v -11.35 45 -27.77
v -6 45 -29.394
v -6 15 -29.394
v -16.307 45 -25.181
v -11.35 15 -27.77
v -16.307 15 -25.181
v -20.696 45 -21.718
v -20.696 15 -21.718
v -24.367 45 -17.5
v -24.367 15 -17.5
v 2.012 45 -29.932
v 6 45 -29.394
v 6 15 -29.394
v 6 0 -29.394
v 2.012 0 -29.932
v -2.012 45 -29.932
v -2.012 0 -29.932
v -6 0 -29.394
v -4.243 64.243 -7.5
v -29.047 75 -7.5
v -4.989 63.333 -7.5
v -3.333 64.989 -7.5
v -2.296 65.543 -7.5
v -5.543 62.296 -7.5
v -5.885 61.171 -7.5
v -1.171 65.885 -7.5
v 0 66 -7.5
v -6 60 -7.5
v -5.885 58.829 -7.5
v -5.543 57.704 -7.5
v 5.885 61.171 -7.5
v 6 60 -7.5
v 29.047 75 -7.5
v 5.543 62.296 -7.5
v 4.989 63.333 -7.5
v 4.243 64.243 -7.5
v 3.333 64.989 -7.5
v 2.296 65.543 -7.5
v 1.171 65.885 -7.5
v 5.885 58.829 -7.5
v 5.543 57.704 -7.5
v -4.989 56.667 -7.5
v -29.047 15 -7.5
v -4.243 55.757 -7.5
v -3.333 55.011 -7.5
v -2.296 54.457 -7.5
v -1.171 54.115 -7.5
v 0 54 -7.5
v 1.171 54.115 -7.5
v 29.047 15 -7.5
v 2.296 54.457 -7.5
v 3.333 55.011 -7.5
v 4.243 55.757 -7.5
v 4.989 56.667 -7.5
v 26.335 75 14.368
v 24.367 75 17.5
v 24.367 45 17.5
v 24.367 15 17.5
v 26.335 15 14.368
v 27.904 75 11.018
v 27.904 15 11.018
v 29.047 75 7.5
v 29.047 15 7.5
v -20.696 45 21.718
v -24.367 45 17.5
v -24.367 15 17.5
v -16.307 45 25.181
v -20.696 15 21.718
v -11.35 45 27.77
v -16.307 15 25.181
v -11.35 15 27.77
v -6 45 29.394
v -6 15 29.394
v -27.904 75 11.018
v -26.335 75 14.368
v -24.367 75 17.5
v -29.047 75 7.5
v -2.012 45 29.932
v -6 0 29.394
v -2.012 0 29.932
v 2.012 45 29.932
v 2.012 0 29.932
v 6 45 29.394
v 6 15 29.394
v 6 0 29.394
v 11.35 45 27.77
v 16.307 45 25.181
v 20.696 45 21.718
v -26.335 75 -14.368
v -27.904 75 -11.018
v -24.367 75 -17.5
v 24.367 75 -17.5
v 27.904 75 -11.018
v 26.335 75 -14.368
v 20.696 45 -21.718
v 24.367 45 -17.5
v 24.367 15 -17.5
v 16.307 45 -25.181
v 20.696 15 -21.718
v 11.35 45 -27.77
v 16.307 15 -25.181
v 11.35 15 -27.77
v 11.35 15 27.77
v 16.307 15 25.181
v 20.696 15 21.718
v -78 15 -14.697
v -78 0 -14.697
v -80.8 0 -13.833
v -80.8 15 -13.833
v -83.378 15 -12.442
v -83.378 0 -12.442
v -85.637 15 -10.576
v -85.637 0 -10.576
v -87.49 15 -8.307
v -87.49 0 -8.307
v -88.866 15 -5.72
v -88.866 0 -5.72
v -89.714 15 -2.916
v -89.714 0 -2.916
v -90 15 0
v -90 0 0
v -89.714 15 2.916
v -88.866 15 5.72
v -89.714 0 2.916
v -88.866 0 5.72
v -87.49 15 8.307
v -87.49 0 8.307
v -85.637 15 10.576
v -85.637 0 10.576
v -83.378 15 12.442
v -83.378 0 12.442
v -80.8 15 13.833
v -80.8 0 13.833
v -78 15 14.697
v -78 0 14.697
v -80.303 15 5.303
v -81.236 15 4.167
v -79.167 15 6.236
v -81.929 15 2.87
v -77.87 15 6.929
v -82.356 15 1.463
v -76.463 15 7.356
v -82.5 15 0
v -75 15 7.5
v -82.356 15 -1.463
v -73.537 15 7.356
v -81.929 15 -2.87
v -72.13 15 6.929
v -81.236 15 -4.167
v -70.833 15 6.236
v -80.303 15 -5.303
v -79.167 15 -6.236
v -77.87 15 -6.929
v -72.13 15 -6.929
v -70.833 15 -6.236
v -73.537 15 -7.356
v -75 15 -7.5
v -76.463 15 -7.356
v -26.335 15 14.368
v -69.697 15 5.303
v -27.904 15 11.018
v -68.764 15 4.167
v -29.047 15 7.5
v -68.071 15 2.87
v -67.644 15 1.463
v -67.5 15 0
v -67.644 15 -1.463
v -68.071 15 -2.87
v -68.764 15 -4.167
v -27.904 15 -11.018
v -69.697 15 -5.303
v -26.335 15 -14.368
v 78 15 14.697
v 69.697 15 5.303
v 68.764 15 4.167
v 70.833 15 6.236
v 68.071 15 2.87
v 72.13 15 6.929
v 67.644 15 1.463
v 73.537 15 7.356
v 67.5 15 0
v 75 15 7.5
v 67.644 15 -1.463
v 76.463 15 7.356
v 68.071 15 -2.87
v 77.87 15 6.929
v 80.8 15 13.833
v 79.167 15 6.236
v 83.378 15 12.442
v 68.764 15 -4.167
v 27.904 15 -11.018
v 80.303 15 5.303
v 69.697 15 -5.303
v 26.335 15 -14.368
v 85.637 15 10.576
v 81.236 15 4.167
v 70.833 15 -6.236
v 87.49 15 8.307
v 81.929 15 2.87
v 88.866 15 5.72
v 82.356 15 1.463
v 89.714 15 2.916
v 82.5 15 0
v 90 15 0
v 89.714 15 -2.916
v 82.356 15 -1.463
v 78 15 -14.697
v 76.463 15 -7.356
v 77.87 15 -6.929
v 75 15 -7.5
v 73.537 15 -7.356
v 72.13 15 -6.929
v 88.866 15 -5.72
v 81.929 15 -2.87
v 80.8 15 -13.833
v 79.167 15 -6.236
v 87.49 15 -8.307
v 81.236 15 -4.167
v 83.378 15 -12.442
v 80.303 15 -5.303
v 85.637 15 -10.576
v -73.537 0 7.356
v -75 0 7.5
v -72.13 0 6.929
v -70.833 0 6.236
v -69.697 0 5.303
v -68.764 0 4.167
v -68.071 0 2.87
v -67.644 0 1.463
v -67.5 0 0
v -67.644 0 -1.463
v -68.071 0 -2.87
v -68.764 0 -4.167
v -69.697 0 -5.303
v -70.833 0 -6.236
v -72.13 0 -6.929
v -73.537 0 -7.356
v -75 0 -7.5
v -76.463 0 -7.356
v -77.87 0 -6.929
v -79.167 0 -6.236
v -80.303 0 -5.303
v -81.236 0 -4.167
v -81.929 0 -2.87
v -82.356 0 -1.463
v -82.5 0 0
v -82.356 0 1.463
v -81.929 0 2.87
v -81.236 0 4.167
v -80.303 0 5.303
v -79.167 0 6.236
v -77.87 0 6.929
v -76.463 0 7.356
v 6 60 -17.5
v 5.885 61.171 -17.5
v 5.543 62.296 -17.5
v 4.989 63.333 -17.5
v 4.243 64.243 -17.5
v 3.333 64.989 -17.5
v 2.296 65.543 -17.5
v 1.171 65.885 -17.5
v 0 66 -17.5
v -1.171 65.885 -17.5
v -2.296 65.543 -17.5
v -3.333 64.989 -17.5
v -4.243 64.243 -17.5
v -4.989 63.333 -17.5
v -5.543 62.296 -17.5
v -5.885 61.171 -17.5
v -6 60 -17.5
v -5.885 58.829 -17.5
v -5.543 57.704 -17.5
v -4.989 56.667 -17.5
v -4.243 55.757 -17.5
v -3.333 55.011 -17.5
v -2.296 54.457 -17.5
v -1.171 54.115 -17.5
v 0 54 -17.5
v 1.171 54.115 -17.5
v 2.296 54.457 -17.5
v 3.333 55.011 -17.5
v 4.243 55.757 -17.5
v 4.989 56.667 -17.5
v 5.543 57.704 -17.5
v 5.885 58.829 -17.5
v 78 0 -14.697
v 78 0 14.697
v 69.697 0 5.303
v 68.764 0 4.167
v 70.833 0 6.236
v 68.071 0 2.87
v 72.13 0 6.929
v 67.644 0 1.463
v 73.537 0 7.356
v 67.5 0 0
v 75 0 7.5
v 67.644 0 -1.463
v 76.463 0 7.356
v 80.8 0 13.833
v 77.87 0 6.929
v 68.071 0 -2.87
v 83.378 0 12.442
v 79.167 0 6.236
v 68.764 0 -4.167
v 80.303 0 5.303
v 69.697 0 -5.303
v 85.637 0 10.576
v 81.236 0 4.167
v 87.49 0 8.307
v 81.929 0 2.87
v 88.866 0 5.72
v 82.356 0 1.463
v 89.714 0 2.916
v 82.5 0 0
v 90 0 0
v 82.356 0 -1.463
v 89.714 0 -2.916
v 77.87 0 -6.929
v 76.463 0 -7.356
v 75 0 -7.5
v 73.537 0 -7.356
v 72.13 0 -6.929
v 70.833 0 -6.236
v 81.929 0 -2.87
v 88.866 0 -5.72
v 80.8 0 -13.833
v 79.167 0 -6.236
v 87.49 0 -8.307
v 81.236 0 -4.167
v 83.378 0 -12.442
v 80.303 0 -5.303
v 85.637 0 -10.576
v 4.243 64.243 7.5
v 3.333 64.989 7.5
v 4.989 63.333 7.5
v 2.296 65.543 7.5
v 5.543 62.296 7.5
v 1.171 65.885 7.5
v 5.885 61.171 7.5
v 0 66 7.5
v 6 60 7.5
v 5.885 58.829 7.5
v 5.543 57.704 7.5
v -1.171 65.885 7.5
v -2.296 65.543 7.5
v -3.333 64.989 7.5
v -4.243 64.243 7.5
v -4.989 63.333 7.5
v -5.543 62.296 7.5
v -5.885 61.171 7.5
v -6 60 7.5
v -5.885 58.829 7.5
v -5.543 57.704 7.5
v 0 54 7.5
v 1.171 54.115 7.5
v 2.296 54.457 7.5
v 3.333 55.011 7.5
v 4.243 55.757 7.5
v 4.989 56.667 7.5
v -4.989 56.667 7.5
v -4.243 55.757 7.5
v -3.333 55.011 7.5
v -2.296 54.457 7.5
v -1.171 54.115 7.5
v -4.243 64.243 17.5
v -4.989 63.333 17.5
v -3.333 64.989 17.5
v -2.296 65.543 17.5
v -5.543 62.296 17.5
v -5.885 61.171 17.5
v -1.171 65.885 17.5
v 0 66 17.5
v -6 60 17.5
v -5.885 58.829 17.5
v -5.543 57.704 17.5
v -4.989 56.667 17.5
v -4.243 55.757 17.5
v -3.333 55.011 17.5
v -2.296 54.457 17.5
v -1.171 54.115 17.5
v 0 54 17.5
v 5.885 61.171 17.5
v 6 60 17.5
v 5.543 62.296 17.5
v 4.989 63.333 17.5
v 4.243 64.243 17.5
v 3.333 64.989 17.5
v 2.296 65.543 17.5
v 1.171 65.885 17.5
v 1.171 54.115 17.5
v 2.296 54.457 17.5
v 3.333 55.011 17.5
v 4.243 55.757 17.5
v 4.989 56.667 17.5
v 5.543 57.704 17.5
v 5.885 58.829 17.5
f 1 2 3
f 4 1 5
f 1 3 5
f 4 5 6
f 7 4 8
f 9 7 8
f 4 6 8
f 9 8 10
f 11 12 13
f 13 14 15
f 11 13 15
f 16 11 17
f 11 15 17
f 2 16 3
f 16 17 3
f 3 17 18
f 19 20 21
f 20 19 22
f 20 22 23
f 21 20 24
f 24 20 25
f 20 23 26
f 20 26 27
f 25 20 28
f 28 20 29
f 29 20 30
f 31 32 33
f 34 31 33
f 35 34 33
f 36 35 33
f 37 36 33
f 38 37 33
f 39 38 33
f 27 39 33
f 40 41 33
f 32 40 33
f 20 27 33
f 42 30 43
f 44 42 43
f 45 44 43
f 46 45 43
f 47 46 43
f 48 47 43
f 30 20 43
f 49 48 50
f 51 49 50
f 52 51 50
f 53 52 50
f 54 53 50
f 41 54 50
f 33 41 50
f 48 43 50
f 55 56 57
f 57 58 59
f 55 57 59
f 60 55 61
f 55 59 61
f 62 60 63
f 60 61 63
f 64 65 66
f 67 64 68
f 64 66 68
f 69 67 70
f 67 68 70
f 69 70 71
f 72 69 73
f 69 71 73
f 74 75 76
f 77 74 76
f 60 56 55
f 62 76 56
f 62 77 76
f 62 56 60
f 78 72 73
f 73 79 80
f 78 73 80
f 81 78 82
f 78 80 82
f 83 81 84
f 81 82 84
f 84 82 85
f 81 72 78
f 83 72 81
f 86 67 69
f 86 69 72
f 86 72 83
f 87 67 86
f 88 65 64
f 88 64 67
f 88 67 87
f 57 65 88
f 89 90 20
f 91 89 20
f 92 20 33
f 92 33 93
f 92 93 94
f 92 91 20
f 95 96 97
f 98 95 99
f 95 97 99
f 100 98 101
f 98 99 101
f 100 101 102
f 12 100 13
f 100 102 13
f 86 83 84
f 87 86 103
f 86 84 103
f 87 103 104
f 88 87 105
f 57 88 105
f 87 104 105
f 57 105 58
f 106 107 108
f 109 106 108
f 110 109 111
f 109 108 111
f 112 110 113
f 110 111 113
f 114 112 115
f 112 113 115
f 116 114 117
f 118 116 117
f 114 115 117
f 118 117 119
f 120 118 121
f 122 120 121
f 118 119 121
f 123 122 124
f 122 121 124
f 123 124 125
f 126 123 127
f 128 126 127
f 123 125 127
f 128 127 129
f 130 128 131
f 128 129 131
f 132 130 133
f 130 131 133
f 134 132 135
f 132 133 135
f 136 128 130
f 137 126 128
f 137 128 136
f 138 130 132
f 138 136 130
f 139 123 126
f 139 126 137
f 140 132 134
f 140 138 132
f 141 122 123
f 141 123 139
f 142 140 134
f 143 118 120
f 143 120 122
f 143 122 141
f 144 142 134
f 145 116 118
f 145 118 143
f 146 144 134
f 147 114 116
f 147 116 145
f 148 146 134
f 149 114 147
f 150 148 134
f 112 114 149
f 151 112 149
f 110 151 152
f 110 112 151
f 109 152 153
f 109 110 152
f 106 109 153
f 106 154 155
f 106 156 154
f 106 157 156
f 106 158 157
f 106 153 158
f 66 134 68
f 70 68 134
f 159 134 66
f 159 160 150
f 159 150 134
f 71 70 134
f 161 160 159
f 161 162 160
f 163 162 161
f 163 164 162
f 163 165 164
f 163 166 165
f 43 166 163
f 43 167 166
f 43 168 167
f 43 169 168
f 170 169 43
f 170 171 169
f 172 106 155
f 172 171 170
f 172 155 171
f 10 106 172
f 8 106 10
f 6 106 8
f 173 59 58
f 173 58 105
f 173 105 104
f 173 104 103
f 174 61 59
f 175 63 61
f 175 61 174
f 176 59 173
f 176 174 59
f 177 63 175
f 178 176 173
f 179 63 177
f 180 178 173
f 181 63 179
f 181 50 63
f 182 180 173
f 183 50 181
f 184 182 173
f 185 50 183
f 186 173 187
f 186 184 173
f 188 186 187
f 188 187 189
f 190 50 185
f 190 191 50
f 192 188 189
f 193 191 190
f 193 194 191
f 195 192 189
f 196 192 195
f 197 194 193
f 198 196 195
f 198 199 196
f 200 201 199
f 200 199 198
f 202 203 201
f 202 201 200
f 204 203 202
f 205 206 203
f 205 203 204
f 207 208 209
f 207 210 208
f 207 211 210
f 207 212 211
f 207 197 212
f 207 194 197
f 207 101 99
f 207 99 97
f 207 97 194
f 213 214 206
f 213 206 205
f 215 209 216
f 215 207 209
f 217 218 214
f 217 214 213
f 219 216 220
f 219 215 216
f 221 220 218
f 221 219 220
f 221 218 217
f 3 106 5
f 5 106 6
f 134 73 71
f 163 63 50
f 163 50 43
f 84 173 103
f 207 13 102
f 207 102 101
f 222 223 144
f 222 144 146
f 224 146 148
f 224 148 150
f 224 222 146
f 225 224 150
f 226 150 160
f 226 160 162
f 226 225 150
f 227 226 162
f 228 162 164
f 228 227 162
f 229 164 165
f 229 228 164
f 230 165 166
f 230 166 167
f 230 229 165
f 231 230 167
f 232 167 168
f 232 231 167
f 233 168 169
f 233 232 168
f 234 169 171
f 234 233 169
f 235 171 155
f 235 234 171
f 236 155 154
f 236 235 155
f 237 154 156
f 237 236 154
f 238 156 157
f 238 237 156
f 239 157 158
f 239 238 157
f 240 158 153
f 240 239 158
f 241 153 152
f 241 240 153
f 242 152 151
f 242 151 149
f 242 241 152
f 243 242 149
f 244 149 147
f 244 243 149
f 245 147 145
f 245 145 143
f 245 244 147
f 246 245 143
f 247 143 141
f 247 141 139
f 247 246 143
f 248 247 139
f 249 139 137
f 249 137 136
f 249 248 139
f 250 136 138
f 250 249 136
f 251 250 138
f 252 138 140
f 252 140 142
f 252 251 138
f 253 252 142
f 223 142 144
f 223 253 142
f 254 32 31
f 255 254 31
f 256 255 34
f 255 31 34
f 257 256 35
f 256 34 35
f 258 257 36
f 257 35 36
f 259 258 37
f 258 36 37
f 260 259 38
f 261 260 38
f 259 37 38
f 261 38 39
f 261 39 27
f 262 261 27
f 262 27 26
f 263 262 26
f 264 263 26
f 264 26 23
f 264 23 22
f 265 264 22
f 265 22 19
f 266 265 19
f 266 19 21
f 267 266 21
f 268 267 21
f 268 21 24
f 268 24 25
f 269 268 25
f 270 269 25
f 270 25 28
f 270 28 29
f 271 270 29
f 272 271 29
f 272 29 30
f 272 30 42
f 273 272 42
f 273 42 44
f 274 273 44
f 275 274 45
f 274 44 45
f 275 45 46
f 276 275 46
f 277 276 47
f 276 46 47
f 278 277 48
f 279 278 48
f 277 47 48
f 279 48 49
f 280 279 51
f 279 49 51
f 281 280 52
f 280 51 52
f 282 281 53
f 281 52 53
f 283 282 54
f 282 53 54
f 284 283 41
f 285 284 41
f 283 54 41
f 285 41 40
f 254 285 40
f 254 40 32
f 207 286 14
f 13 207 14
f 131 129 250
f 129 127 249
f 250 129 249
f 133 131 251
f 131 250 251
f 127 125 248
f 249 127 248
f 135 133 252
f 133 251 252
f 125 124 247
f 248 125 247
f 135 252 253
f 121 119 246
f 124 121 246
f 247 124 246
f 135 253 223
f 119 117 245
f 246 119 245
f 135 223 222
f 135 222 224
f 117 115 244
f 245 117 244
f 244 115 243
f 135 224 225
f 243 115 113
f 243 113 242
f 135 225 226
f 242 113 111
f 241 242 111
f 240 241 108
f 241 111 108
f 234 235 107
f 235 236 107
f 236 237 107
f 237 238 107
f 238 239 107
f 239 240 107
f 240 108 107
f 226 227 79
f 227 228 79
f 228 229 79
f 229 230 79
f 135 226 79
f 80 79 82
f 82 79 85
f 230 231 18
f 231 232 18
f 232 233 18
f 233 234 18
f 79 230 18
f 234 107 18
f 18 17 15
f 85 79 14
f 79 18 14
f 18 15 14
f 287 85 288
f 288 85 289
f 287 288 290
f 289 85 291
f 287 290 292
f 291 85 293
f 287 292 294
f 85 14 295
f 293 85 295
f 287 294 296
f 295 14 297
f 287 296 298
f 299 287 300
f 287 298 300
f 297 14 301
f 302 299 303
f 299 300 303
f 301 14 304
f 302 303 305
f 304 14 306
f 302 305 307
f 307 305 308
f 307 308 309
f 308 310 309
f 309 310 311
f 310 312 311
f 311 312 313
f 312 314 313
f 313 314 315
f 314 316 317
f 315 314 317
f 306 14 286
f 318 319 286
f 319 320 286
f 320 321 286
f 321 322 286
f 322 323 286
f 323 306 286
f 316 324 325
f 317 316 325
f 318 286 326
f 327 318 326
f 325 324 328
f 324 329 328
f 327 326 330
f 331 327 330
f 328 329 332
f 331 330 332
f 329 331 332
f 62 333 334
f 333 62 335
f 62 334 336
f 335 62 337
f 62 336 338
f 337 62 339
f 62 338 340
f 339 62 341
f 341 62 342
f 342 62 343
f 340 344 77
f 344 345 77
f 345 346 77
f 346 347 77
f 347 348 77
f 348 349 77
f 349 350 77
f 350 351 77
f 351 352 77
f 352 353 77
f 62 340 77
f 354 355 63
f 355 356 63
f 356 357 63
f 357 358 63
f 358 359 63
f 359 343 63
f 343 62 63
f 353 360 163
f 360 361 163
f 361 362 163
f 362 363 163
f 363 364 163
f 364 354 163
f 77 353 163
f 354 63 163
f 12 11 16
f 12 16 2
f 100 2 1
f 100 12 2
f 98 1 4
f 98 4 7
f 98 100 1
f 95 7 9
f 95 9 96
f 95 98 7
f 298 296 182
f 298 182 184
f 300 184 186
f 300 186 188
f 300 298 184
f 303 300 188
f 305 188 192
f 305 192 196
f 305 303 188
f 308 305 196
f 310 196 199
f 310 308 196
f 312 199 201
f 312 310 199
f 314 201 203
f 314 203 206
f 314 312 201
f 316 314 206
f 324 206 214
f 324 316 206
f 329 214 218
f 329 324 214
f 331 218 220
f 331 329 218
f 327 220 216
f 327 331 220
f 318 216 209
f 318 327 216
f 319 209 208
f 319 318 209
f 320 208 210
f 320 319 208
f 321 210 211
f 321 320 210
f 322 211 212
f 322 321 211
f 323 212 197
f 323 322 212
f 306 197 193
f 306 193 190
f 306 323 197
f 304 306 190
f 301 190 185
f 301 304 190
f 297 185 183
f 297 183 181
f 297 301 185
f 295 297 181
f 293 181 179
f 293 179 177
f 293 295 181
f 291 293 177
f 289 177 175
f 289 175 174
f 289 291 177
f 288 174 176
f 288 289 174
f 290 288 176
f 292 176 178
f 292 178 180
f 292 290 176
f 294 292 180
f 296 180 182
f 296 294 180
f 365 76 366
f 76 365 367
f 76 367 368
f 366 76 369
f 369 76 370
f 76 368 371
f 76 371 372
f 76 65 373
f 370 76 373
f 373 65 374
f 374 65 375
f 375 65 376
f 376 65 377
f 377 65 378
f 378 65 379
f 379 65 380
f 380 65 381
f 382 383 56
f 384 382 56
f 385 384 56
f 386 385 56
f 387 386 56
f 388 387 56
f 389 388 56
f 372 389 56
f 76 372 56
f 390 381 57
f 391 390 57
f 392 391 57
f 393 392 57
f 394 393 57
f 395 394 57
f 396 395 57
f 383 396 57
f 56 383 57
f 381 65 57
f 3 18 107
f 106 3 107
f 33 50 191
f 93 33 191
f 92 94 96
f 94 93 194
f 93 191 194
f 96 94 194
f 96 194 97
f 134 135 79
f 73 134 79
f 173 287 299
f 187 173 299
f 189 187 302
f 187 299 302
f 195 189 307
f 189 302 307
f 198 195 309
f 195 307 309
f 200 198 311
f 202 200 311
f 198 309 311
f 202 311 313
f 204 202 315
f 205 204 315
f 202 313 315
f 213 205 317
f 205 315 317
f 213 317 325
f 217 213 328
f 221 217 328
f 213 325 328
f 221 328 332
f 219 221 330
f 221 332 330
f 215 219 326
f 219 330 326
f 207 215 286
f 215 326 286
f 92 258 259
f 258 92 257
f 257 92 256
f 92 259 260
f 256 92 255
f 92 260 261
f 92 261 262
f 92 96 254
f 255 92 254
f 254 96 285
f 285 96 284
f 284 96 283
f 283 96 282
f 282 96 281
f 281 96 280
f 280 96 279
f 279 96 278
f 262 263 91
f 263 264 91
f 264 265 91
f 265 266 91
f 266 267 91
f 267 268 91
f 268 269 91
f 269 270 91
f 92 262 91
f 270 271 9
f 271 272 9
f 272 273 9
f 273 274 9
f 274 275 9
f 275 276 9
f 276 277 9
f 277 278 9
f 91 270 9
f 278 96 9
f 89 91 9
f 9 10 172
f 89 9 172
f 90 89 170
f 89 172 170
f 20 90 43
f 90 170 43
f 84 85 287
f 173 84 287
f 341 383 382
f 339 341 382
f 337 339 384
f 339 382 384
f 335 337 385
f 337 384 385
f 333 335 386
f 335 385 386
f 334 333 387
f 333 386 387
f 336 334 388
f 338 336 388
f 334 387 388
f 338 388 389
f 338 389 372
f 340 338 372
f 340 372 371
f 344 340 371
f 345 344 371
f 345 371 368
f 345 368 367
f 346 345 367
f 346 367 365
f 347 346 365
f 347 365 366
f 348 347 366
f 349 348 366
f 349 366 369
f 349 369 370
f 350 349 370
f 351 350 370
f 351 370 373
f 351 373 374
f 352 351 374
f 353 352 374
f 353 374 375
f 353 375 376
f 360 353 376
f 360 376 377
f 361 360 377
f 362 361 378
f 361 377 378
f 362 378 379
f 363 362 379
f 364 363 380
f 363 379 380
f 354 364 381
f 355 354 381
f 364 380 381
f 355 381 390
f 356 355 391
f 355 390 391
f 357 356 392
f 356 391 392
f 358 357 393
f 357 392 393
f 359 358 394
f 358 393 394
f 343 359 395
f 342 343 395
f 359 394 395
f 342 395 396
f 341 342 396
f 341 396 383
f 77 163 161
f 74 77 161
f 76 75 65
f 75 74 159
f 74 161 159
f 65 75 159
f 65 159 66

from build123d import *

# Parameters (mm, degrees)
BOSS_EXTRUDE1_DEPTH   = 75
BOSS_EXTRUDE1_2_DEPTH = 75
BOSS_EXTRUDE2_DEPTH   = 45
SKETCH1_5_R           = 7.5
BOSS_EXTRUDE3_DEPTH   = 15
SKETCH2_R             = 6
CUT_EXTRUDE1_DEPTH    = 127.416968798


with BuildPart() as part:
    # Sketch1 → Boss-Extrude1 (new body)
    with BuildSketch(Plane(origin=(0, 0, 0), x_dir=(1, 0, 0), z_dir=(0, 1, 0))):
        with BuildLine():
            Line((24.366985862, 17.5), (-24.366985862, 17.5))
            ThreePointArc((-24.366985862, 17.5), (-27.171188586, 12.717173855), (-29.047375097, 7.5))
            Line((-29.047375097, 7.5), (29.047375097, 7.5))
            ThreePointArc((29.047375097, 7.5), (27.171188586, 12.717173855), (24.366985862, 17.5))
        make_face()
    extrude(amount=BOSS_EXTRUDE1_DEPTH)



with BuildPart() as body_2:
    # Sketch1 → Boss-Extrude1 2 (new body)
    with BuildSketch(Plane(origin=(0, 0, 0), x_dir=(1, 0, 0), z_dir=(0, 1, 0))):
        with BuildLine():
            ThreePointArc((-29.047375097, -7.5), (-27.171188586, -12.717173855), (-24.366985862, -17.5))
            Line((-24.366985862, -17.5), (24.366985862, -17.5))
            ThreePointArc((24.366985862, -17.5), (27.171188586, -12.717173855), (29.047375097, -7.5))
            Line((29.047375097, -7.5), (-29.047375097, -7.5))
        make_face()
    extrude(amount=BOSS_EXTRUDE1_2_DEPTH)


with BuildPart() as part_1:
    add(part.part)

    add(body_2.part)  # Boss-Extrude2 merges body 2
    # Sketch1<4> → Boss-Extrude2 (add)
    with BuildSketch(Plane(origin=(0, 0, 0), x_dir=(1, 0, 0), z_dir=(0, 1, 0))):
        with BuildLine():
            ThreePointArc((24.366985862, 17.5), (0, 30), (-24.366985862, 17.5))
            Line((-24.366985862, 17.5), (24.366985862, 17.5))
        make_face()
        with BuildLine():
            ThreePointArc((-24.366985862, -17.5), (0, -30), (24.366985862, -17.5))
            Line((24.366985862, -17.5), (-24.366985862, -17.5))
        make_face()
    extrude(amount=BOSS_EXTRUDE2_DEPTH)

    # Sketch1<5> → Boss-Extrude3 (add)
    with BuildSketch(Plane(origin=(0, 0, 0), x_dir=(1, 0, 0), z_dir=(0, 1, 0))):
        with BuildLine():
            ThreePointArc((-29.047375097, 7.5), (-27.171188586, 12.717173855), (-24.366985862, 17.5))
            ThreePointArc((-24.366985862, 17.5), (-16.306579488, 25.18125226), (-6, 29.393876913))
            Line((-6, 29.393876913), (-78, 14.696938457))
            ThreePointArc((-78, 14.696938457), (-90, 0), (-78, -14.696938457))
            Line((-78, -14.696938457), (-6, -29.393876913))
            ThreePointArc((-6, -29.393876913), (-16.306579488, -25.18125226), (-24.366985862, -17.5))
            ThreePointArc((-24.366985862, -17.5), (-27.171188586, -12.717173855), (-29.047375097, -7.5))
            Line((-29.047375097, -7.5), (29.047375097, -7.5))
            ThreePointArc((29.047375097, -7.5), (27.171188586, -12.717173855), (24.366985862, -17.5))
            ThreePointArc((24.366985862, -17.5), (16.306579488, -25.18125226), (6, -29.393876913))
            Line((6, -29.393876913), (78, -14.696938457))
            ThreePointArc((78, -14.696938457), (90, 0), (78, 14.696938457))
            Line((78, 14.696938457), (6, 29.393876913))
            ThreePointArc((6, 29.393876913), (16.306579488, 25.18125226), (24.366985862, 17.5))
            ThreePointArc((24.366985862, 17.5), (27.171188586, 12.717173855), (29.047375097, 7.5))
            Line((29.047375097, 7.5), (-29.047375097, 7.5))
        make_face()
        with Locations((-75, 0)):
            Circle(SKETCH1_5_R, mode=Mode.SUBTRACT)
        with Locations((75, 0)):
            Circle(SKETCH1_5_R, mode=Mode.SUBTRACT)
    extrude(amount=BOSS_EXTRUDE3_DEPTH)

    # Sketch2 → Cut-Extrude1 (cut, through all)
    with BuildSketch(Plane.XY.offset(17.5)):
        with Locations((0, 60)):
            Circle(SKETCH2_R)
    extrude(amount=-CUT_EXTRUDE1_DEPTH, mode=Mode.SUBTRACT)


solid = part_1.part
